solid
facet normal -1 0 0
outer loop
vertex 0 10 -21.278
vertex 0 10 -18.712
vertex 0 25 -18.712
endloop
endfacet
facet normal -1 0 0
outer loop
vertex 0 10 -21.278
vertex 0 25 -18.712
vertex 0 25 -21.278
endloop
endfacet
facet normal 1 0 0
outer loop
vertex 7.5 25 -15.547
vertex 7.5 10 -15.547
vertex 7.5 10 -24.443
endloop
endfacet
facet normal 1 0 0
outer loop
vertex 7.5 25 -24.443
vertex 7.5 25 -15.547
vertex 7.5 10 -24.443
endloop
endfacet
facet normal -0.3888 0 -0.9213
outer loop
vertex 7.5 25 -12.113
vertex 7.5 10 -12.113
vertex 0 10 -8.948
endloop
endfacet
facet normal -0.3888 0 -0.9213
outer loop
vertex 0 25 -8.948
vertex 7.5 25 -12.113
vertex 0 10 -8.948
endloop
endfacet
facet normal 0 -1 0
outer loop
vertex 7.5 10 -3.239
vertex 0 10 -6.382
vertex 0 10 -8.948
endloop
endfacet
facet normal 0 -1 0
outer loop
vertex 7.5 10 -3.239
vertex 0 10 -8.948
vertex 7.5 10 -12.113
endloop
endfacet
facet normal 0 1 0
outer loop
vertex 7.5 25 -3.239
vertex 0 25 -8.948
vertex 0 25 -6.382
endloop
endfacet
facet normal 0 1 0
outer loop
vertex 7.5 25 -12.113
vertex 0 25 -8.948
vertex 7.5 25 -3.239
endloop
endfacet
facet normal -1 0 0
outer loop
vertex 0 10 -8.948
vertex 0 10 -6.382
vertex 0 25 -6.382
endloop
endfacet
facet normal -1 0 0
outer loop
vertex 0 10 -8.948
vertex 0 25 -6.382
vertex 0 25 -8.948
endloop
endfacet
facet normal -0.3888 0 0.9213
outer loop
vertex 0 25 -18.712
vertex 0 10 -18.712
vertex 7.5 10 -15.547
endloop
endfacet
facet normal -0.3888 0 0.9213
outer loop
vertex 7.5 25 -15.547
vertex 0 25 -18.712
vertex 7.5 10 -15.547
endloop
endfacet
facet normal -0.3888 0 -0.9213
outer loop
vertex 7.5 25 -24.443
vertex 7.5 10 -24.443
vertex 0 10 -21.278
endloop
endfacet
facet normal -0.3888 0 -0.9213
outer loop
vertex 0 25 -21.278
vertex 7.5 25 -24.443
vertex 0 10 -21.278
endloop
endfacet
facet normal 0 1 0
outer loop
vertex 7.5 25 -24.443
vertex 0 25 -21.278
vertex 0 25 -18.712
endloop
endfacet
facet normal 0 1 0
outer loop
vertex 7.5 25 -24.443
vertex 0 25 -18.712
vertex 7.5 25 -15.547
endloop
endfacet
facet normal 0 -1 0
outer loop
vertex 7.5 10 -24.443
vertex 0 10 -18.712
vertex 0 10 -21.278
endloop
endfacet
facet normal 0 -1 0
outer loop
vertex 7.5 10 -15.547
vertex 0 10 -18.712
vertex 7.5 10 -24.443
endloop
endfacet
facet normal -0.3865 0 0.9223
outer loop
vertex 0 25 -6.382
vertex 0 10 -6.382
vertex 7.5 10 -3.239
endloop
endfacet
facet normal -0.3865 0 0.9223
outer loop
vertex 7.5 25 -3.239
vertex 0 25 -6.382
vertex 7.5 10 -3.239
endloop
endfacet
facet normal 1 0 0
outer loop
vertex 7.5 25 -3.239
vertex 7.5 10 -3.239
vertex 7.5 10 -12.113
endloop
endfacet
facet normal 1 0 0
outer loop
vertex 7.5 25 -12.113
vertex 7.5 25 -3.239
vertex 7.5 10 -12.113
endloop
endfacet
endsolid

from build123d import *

# Parameters (mm, degrees)
SKETCH1_W               = 7.5
SKETCH1_H               = 27.66
BOSS_EXTRUDE1_DEPTH     = 25
SKETCH2_W               = 7.5
SKETCH2_H               = 27.66
CUT_EXTRUDE1_DEPTH      = 10
CUT_EXTRUDE2_DEPTH      = 1
CUT_EXTRUDE2_DEPTH_BACK = 16
CUT_EXTRUDE3_DEPTH      = 1
CUT_EXTRUDE3_DEPTH_BACK = 16


with BuildPart() as part:
    # Sketch1 → Boss-Extrude1 (new body)
    with BuildSketch(Plane(origin=(0, 0, 0), x_dir=(1, 0, 0), z_dir=(0, 1, 0))):
        with Locations((3.75, 13.83)):
            Rectangle(SKETCH1_W, SKETCH1_H)
    extrude(amount=BOSS_EXTRUDE1_DEPTH)

    # Sketch2 → Cut-Extrude1 (cut)
    with BuildSketch(Plane.XZ):
        with Locations((3.75, -13.83)):
            Rectangle(SKETCH2_W, SKETCH2_H)
    extrude(amount=-CUT_EXTRUDE1_DEPTH, mode=Mode.SUBTRACT)

    # Sketch3 → Cut-Extrude2 (cut, two sides)
    with BuildSketch(Plane.XZ.offset(-10)) as cut_extrude2_sk:
        Polygon((0, -5.948150323), (0, -6.381849677), (7.5, -3.239049355), (7.5, -2.805350002), align=None)
        Polygon((7.5, -12.112920844), (0, -8.947920844), (0, -9.382079156), (7.5, -12.547079156), align=None)
        Polygon((0, -17.626683376), (0, -18.712079156), (7.5, -15.547079156), (7.5, -14.461683376), align=None)
        Polygon((7.5, -24.442920844), (0, -21.277920844), (0, -21.712079156), (7.5, -24.877079156), align=None)
    extrude(amount=CUT_EXTRUDE2_DEPTH, mode=Mode.SUBTRACT)
    extrude(cut_extrude2_sk.sketch, amount=-CUT_EXTRUDE2_DEPTH_BACK, mode=Mode.SUBTRACT)

    # Sketch4 → Cut-Extrude3 (cut, two sides)
    with BuildSketch(Plane.XZ.offset(-10)) as cut_extrude3_sk:
        Polygon((0, 0), (7.5, 0), (7.5, -2.805350002), (0, -5.948150323), align=None)
        Polygon((0, -9.382079156), (7.5, -12.547079156), (7.5, -14.78730211), (0, -17.626683376), align=None)
        Polygon((0, -21.712079156), (7.5, -24.877079156), (7.5, -27.66), (0, -27.66), align=None)
    extrude(amount=CUT_EXTRUDE3_DEPTH, mode=Mode.SUBTRACT)
    extrude(cut_extrude3_sk.sketch, amount=-CUT_EXTRUDE3_DEPTH_BACK, mode=Mode.SUBTRACT)


solid = part.part
